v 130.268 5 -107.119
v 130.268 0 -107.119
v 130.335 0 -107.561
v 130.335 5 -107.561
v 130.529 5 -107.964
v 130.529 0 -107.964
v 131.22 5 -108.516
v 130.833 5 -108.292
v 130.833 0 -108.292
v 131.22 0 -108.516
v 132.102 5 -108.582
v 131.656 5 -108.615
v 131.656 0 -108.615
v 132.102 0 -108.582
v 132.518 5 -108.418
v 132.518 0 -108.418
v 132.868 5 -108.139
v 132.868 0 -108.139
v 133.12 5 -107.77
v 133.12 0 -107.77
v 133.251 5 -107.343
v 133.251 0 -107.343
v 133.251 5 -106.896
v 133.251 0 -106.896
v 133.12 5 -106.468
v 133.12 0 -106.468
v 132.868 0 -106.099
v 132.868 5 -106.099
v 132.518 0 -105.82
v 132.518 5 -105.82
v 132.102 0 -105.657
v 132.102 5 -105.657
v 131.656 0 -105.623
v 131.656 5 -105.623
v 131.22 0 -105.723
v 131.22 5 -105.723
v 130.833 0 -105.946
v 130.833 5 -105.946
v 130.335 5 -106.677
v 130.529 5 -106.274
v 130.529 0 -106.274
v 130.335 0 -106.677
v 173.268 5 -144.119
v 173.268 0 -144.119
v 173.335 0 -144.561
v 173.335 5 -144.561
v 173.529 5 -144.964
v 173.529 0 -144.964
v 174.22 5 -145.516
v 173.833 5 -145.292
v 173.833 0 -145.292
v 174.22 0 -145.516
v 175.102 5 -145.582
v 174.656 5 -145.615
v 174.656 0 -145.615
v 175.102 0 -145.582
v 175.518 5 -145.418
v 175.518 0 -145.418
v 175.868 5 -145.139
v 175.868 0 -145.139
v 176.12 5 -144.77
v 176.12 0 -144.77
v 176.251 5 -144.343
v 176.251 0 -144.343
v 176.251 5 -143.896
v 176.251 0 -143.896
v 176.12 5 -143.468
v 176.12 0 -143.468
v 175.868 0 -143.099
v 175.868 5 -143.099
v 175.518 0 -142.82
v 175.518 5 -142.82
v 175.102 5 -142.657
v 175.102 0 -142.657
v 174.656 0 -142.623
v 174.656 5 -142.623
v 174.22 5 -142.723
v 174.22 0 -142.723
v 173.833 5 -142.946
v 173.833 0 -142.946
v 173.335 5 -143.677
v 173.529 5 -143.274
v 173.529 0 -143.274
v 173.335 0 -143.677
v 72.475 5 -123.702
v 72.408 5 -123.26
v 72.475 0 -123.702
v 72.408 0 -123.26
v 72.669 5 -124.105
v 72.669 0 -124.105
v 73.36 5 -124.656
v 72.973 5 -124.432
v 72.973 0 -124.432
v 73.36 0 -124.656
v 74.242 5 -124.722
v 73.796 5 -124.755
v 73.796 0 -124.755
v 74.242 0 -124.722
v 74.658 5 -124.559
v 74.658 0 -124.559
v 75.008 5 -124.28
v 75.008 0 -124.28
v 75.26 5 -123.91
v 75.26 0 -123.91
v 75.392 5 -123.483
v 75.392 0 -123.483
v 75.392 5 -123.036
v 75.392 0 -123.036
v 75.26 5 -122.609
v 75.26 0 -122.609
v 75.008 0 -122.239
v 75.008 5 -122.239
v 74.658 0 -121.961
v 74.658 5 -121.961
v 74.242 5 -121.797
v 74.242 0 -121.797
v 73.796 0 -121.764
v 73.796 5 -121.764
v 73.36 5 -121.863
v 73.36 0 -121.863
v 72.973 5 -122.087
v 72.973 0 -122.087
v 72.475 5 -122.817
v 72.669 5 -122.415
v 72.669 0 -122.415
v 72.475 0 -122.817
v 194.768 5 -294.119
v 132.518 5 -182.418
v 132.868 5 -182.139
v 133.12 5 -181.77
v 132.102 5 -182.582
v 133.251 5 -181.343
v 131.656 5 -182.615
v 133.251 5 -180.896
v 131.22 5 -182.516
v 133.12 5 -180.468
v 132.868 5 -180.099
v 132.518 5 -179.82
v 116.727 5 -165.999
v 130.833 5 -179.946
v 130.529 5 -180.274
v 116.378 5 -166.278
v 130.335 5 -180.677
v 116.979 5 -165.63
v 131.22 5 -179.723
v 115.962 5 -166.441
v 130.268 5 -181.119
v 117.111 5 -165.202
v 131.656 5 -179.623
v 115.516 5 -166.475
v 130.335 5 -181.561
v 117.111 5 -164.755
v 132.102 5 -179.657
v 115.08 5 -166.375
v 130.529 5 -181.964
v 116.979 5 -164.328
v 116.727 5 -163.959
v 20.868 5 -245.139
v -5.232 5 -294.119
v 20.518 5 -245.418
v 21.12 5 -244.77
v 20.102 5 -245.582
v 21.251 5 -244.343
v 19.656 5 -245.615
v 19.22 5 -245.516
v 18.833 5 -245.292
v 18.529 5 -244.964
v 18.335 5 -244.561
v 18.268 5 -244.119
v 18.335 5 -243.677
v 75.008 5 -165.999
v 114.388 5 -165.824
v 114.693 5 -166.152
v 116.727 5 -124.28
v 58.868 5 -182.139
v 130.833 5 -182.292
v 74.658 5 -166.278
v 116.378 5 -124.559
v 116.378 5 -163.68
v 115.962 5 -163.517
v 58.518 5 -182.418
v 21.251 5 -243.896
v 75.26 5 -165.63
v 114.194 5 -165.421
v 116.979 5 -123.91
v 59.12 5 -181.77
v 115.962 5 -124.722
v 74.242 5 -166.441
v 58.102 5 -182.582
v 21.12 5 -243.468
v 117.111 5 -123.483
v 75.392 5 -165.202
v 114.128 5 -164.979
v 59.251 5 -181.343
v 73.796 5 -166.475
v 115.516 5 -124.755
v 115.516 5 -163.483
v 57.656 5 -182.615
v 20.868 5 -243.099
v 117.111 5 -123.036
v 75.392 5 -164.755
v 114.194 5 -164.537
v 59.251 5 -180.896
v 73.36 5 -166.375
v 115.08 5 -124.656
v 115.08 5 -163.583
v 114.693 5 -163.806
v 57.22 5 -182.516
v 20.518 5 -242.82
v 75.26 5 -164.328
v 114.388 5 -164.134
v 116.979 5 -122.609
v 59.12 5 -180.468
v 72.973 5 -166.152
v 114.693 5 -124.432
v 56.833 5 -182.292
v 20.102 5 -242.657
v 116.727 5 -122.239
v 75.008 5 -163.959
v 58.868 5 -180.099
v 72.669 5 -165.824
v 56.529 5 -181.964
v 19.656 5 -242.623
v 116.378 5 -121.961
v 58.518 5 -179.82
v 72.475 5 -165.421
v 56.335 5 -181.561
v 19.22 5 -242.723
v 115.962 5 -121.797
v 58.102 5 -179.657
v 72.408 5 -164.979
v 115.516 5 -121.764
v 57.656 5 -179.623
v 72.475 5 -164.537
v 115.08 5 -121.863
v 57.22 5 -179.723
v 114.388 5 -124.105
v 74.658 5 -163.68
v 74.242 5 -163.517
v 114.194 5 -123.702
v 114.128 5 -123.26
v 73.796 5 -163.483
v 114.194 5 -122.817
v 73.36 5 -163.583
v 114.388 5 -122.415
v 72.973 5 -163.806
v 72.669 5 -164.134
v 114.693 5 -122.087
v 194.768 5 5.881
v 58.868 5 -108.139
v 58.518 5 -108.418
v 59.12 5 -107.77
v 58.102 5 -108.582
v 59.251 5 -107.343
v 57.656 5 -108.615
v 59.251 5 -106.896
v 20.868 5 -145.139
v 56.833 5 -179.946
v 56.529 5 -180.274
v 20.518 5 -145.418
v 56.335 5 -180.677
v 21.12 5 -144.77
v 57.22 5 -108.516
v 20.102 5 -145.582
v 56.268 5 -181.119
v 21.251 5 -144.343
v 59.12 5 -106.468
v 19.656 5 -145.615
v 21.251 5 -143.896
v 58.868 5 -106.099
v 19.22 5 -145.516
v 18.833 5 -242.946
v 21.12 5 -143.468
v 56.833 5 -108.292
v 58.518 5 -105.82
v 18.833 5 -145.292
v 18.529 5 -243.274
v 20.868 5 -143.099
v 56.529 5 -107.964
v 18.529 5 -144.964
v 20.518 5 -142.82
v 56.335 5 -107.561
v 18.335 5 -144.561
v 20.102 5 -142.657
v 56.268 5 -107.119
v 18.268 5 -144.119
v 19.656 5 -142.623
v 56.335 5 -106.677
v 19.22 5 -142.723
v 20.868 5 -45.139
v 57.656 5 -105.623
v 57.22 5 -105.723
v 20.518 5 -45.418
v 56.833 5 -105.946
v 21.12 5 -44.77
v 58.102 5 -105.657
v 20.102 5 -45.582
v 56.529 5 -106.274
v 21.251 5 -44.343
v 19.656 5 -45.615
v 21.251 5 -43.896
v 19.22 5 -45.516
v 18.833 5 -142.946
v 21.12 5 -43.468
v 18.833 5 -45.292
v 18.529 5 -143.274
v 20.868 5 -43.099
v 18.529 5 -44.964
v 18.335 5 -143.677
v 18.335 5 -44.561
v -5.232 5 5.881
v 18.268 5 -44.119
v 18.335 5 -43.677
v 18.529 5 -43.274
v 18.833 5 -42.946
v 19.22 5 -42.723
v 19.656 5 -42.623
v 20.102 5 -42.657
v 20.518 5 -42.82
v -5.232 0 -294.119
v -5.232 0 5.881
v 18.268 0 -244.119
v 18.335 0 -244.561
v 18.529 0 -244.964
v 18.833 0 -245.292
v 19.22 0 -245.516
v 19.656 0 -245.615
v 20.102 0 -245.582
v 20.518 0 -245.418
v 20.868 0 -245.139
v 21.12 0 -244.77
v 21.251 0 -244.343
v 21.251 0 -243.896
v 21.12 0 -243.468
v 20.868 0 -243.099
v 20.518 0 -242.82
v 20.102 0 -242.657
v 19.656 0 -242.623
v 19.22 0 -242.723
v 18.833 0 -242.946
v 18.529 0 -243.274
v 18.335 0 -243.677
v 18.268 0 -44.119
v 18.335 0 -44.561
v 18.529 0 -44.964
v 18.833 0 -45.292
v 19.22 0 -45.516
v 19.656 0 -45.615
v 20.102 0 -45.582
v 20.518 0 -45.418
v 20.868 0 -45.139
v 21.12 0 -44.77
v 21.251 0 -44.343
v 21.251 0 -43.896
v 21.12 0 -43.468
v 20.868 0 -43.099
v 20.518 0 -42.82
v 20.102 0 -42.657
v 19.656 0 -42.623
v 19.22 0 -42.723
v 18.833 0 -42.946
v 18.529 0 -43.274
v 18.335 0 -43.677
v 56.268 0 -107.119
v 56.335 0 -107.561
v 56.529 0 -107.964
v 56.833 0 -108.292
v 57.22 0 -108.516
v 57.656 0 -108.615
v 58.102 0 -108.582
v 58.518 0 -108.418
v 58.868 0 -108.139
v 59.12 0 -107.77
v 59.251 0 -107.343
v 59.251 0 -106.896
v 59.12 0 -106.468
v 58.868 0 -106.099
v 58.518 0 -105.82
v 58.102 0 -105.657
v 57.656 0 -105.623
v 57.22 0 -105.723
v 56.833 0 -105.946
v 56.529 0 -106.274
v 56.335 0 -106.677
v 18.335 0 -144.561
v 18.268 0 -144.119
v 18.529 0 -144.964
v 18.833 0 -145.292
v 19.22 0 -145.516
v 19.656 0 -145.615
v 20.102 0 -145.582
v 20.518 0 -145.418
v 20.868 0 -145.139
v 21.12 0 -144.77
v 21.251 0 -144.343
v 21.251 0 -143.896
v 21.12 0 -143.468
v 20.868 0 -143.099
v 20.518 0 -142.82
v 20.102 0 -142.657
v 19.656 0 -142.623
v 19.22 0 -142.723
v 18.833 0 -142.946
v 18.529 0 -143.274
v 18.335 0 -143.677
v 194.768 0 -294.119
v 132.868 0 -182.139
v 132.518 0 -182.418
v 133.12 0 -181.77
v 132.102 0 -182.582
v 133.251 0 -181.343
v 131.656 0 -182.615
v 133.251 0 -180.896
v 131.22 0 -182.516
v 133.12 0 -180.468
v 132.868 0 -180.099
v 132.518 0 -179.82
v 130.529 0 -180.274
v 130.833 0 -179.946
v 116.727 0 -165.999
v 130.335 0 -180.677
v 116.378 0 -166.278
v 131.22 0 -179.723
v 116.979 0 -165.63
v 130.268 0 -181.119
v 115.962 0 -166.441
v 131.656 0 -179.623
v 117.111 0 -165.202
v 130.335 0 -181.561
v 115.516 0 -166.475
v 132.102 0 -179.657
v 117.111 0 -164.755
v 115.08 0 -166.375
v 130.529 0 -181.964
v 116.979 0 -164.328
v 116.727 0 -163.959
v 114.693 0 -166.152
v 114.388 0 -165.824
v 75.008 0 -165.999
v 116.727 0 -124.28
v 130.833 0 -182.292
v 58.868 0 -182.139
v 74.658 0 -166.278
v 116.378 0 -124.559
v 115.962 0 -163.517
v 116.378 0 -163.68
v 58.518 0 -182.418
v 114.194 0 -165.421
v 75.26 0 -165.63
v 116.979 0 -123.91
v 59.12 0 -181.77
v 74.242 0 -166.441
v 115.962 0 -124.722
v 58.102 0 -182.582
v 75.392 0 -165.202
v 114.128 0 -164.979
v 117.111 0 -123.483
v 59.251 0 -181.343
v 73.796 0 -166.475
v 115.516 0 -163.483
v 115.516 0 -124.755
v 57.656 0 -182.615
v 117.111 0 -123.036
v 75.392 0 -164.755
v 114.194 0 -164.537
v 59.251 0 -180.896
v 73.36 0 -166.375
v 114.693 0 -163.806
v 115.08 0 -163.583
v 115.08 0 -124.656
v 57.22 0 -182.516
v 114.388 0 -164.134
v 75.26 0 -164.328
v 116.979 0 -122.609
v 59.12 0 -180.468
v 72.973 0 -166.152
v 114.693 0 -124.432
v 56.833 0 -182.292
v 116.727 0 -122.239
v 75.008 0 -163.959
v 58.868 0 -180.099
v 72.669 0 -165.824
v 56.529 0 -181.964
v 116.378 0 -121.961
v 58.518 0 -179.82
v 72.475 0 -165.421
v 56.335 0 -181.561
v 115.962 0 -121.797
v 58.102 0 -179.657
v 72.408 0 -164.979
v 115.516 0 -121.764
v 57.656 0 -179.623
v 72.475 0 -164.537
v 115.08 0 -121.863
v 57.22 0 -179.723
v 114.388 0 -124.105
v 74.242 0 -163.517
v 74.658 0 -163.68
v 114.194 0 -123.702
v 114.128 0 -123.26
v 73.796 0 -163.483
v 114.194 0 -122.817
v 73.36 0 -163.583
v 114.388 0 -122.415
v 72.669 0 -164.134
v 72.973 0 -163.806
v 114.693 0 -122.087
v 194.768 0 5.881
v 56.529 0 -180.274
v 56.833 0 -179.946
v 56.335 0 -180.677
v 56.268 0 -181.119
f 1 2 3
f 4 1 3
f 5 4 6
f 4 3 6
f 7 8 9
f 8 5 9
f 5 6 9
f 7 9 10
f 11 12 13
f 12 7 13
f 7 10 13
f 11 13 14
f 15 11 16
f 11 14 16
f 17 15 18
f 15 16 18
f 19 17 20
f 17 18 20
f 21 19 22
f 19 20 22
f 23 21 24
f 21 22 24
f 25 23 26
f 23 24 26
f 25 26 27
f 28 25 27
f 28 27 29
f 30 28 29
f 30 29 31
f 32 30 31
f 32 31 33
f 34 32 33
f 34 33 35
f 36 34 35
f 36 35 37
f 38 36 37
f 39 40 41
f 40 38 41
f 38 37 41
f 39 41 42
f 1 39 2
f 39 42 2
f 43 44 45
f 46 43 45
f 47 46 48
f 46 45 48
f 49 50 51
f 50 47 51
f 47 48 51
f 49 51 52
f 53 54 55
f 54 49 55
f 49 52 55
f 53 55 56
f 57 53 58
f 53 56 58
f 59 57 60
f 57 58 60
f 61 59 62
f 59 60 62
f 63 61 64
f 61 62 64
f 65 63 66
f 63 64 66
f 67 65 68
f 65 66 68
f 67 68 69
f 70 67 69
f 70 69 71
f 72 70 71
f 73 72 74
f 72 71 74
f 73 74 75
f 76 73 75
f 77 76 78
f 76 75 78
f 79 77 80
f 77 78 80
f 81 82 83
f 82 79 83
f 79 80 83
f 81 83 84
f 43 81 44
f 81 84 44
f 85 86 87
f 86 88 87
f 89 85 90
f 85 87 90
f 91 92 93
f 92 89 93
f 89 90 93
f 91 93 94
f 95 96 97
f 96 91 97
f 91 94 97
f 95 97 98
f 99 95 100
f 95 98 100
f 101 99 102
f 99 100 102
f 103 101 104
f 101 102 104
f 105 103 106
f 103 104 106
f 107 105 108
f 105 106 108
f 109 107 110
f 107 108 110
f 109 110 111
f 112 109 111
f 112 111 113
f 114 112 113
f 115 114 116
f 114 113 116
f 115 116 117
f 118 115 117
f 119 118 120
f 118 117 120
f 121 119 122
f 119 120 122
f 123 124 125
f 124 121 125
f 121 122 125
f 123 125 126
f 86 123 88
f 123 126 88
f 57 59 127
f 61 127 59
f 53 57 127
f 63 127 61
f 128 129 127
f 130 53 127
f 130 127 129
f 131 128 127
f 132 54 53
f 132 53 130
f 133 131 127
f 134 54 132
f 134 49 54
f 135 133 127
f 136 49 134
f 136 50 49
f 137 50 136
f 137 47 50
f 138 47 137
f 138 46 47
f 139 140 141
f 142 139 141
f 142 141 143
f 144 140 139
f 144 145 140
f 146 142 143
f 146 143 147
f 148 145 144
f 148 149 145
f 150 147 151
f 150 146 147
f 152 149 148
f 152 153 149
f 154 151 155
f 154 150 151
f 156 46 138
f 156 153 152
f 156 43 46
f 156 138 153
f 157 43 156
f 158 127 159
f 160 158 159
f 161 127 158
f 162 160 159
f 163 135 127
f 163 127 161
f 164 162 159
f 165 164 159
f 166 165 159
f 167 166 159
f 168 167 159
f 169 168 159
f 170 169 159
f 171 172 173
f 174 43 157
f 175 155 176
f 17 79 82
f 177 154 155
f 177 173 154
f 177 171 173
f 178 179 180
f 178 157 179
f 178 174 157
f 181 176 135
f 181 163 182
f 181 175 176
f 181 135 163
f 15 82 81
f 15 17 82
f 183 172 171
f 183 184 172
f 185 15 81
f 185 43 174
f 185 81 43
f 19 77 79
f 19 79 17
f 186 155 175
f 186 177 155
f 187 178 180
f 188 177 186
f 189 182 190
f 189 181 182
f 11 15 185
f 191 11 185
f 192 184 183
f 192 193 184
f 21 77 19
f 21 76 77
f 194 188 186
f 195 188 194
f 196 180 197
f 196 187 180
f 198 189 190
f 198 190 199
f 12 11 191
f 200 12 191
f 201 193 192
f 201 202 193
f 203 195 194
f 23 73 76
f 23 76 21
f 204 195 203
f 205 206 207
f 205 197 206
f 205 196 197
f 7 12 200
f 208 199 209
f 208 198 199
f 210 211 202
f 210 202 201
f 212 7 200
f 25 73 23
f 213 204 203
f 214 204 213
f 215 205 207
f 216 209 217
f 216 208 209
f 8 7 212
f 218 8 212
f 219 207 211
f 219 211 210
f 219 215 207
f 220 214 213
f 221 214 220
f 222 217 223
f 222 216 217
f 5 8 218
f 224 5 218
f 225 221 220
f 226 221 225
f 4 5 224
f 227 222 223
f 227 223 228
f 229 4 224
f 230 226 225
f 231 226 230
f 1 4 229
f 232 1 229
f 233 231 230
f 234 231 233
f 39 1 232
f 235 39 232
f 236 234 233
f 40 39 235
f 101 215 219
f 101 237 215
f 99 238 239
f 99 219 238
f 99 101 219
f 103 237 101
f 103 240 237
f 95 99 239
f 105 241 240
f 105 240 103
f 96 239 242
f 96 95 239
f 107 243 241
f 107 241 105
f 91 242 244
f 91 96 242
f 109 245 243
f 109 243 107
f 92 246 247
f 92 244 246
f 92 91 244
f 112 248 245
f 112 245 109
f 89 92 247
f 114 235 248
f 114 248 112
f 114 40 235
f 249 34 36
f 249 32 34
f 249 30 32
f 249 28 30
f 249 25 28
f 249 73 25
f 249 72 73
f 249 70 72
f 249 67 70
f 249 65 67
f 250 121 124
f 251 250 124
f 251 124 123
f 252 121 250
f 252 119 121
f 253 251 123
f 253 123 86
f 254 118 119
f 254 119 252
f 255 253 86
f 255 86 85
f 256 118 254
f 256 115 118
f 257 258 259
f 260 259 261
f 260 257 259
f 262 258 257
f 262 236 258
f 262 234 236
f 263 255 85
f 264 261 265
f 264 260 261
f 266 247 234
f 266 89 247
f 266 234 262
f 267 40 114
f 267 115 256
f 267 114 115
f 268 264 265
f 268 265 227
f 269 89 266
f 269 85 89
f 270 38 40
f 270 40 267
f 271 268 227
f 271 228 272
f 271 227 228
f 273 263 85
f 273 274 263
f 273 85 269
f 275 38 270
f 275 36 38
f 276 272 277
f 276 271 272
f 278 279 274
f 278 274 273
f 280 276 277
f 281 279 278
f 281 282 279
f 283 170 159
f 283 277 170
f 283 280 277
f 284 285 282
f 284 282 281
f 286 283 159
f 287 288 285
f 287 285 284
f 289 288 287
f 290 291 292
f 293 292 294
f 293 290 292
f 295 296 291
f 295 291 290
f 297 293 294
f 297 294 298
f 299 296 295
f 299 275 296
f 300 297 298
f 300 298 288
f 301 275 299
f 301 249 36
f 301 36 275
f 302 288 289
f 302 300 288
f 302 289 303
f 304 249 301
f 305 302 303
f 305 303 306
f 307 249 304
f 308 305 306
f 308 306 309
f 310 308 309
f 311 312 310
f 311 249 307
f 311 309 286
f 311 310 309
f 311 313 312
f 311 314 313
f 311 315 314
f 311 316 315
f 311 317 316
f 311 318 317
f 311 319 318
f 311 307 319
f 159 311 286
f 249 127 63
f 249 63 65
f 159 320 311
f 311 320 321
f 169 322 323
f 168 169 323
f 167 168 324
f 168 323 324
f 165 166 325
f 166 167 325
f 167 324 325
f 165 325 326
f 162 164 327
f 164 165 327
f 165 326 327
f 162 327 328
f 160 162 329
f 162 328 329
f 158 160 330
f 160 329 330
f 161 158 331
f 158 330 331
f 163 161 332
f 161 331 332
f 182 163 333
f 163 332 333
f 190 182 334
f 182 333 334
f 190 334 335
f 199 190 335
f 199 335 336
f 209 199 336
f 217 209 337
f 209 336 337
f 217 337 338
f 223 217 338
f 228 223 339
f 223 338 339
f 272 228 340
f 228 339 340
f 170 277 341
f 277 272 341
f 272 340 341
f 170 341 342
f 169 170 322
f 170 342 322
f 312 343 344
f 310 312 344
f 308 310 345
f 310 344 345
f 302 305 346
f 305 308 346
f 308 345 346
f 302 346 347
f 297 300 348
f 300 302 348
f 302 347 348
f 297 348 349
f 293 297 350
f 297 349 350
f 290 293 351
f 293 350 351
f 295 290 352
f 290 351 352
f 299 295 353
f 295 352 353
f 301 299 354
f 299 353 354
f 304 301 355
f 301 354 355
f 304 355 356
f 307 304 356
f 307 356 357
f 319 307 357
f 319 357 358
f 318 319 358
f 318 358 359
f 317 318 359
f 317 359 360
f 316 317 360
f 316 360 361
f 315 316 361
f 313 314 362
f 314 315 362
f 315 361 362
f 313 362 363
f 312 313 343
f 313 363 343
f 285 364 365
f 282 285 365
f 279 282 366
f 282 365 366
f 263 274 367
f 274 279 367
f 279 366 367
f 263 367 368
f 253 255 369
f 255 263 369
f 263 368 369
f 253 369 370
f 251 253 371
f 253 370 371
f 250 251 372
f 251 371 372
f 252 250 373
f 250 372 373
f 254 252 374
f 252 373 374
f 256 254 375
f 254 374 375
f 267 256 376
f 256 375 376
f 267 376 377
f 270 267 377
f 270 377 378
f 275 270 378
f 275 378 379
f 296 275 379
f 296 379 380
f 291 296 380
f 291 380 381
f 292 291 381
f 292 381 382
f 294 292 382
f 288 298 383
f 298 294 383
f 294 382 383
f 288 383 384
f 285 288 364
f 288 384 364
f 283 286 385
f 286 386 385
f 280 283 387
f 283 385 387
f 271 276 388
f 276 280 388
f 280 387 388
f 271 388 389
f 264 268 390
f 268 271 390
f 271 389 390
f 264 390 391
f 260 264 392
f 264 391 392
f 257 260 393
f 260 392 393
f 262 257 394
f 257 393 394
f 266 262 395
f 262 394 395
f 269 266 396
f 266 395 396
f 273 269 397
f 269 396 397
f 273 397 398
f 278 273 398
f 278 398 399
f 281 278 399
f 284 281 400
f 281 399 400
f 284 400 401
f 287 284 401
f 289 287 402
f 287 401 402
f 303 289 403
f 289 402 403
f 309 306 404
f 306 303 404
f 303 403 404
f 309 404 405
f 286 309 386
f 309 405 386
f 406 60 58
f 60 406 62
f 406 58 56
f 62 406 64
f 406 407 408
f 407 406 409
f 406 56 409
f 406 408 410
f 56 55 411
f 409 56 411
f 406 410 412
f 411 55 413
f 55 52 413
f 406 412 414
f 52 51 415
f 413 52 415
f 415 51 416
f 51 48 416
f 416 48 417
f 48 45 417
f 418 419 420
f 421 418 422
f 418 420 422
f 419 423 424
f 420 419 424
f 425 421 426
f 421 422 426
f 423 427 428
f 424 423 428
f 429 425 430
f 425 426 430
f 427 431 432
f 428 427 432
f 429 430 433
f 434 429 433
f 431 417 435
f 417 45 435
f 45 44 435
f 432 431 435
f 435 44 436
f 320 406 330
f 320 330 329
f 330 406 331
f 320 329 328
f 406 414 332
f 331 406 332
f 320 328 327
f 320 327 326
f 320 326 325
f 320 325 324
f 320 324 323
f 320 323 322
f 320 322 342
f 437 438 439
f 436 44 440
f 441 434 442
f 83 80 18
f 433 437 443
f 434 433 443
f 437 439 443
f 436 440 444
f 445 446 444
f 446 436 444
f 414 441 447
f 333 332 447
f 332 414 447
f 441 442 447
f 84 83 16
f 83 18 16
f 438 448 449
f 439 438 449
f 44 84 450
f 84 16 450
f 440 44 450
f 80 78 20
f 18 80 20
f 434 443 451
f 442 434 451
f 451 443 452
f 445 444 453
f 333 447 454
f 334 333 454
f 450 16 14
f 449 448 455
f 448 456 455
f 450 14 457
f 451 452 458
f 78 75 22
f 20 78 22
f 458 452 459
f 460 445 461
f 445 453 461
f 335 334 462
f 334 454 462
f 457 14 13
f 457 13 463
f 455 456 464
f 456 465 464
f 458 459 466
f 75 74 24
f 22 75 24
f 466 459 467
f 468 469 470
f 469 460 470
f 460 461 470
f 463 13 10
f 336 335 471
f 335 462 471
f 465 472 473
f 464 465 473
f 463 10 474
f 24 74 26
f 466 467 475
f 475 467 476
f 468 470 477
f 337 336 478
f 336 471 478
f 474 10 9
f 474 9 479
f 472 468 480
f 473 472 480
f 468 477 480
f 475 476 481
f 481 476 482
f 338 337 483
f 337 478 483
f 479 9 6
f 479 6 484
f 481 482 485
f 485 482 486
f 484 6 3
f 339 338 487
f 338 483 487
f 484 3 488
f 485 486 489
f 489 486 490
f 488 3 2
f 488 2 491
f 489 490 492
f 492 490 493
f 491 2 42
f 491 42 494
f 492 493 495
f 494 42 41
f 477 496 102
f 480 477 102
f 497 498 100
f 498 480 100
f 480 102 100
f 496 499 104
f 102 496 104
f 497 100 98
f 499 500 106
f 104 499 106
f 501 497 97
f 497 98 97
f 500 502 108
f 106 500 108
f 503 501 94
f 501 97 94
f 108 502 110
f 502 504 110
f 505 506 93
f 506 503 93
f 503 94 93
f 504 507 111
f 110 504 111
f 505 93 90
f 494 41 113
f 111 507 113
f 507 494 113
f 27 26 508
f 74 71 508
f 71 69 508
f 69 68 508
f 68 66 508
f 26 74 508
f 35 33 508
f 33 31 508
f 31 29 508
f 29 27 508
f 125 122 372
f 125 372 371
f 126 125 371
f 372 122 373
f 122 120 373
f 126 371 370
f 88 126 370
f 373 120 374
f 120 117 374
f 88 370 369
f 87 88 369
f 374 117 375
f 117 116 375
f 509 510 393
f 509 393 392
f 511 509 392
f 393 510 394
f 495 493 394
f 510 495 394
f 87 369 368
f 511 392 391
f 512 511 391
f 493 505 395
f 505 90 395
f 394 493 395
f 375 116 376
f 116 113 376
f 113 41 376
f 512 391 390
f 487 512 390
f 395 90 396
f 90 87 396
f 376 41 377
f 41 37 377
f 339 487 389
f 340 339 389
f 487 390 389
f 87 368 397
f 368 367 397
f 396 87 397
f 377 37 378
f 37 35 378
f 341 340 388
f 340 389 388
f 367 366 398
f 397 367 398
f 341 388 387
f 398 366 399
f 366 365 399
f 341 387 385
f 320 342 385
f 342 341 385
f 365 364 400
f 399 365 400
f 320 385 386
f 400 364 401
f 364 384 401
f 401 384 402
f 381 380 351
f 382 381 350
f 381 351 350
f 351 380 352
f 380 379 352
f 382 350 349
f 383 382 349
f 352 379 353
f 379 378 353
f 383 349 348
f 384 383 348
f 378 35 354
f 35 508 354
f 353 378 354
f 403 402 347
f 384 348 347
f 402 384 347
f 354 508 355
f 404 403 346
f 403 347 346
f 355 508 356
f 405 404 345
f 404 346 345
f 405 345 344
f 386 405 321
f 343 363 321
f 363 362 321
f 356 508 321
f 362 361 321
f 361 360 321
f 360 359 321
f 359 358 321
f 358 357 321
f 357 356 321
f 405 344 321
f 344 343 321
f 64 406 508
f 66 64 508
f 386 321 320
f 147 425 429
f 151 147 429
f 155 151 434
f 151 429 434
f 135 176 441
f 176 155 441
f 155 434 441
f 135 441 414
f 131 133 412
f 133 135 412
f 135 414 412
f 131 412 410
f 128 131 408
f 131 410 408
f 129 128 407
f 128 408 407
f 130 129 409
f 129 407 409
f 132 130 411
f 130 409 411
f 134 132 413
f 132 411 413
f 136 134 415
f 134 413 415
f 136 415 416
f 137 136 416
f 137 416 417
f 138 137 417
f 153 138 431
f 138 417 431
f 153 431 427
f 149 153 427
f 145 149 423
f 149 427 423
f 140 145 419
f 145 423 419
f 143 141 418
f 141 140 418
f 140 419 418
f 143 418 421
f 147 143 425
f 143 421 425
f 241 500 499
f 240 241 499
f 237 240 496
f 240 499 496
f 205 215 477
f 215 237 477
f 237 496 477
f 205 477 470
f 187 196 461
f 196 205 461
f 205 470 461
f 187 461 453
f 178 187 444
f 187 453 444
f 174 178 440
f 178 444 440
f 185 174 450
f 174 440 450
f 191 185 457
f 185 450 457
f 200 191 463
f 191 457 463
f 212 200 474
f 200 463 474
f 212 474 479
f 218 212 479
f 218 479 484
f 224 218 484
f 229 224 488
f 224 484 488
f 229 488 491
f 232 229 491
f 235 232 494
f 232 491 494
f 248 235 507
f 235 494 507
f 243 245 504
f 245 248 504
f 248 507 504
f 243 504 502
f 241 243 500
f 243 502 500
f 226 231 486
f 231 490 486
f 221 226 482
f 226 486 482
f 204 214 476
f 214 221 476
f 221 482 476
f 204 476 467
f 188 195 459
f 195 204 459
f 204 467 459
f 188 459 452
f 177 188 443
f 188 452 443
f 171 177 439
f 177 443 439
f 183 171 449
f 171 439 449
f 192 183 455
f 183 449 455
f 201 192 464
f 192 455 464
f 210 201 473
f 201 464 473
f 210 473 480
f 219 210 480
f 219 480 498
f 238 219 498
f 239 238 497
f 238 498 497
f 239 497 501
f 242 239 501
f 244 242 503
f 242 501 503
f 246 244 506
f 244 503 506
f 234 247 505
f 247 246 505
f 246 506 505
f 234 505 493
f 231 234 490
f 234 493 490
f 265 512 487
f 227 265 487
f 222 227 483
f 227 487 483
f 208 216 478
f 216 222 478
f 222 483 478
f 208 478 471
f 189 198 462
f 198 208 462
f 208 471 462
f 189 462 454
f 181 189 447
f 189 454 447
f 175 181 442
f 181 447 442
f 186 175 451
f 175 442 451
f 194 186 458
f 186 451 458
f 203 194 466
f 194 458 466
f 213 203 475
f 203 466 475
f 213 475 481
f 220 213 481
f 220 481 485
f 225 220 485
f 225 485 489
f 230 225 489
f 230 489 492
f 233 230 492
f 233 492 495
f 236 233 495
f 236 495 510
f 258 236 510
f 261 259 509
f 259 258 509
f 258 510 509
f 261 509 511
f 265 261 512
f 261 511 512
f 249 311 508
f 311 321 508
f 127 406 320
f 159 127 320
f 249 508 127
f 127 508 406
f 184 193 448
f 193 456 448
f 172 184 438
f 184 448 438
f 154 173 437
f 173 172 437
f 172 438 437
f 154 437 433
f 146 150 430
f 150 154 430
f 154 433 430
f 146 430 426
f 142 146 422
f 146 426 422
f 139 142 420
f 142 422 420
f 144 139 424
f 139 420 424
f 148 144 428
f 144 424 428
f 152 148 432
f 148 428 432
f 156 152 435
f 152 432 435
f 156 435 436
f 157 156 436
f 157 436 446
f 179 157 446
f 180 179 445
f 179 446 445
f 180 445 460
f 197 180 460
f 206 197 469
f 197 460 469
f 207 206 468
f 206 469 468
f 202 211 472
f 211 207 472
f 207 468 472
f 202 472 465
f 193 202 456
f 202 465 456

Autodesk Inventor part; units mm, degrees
ref_plane "YZ Plane" through (0, 0, 0) normal (1, 0, 0) x (0, 1, 0)
ref_plane "XZ Plane" through (0, 0, 0) normal (0, 1, 0) x (-1, 0, 0)
ref_plane "XY Plane" through (0, 0, 0) normal (0, 0, 1) x (1, 0, 0)
sketch "Sketch1" plane through (0, 0, 0) normal (0, 1, 0) x (-1, 0, 0)
  line L0 (5.2319, 5.8808) -> (-194.7681, 5.8808)
  line L1 (-194.7681, 5.8808) -> (-194.7681, -294.1192)
  line L2 (-194.7681, -294.1192) -> (5.2319, -294.1192)
  line L3 (5.2319, -294.1192) -> (5.2319, 5.8808)
  circle A0 centre (-73.9085, -123.2596) radius 1.5
  circle A1 centre (-73.9085, -164.9789) radius 1.5
  circle A2 centre (-115.6278, -123.2596) radius 1.5
  circle A3 centre (-115.6278, -164.9789) radius 1.5
  circle A4 centre (-131.7681, -181.1192) radius 1.5
  circle A5 centre (-57.7681, -181.1192) radius 1.5
  circle A6 centre (-57.7681, -107.1192) radius 1.5
  circle A7 centre (-131.7681, -107.1192) radius 1.5
  circle A8 centre (-19.7681, -144.1192) radius 1.5
  circle A9 centre (-19.7681, -44.1192) radius 1.5
  circle A10 centre (-19.7681, -244.1192) radius 1.5
  circle A11 centre (-174.7681, -144.1192) radius 1.5
  point P0 (0, 0)
  point P1 (-94.7681, -144.1192)
  dimension "d0" = 300
  dimension "d1" = 200
  dimension "d19" = 150
  dimension "d20" = 100
  dimension "d25" = 29.5
  dimension "d26" = 29.5
  dimension "d27" = 29.5
  dimension "d28" = 29.5
  dimension "d29" = 79.1403
  dimension "d30" = 129.1404
  dimension "d31" = 79.1403
  dimension "d32" = 129.1404
  dimension "d33" = 3
  dimension "d34" = 3
  dimension "d35" = 3
  dimension "d36" = 3
  dimension "d37" = 37
  dimension "d38" = 37
  dimension "d39" = 3
  dimension "d40" = 37
  dimension "d41" = 37
  dimension "d42" = 3
  dimension "d43" = 37
  dimension "d44" = 37
  dimension "d45" = 3
  dimension "d46" = 37
  dimension "d47" = 37
  dimension "d48" = 3
  dimension "d49" = 150
  dimension "d51" = 3
  dimension "d52" = 25
  dimension "d53" = 25
  dimension "d54" = 25
  dimension "d55" = 50
  dimension "d56" = 50
  dimension "d57" = 3
  dimension "d58" = 3
  dimension "d59" = 20
  dimension "d60" = 150
  dimension "d61" = 3
extrude "Extrusion1" add sketch "Sketch1" along normal blind 5
properties part number "toit_robot"
